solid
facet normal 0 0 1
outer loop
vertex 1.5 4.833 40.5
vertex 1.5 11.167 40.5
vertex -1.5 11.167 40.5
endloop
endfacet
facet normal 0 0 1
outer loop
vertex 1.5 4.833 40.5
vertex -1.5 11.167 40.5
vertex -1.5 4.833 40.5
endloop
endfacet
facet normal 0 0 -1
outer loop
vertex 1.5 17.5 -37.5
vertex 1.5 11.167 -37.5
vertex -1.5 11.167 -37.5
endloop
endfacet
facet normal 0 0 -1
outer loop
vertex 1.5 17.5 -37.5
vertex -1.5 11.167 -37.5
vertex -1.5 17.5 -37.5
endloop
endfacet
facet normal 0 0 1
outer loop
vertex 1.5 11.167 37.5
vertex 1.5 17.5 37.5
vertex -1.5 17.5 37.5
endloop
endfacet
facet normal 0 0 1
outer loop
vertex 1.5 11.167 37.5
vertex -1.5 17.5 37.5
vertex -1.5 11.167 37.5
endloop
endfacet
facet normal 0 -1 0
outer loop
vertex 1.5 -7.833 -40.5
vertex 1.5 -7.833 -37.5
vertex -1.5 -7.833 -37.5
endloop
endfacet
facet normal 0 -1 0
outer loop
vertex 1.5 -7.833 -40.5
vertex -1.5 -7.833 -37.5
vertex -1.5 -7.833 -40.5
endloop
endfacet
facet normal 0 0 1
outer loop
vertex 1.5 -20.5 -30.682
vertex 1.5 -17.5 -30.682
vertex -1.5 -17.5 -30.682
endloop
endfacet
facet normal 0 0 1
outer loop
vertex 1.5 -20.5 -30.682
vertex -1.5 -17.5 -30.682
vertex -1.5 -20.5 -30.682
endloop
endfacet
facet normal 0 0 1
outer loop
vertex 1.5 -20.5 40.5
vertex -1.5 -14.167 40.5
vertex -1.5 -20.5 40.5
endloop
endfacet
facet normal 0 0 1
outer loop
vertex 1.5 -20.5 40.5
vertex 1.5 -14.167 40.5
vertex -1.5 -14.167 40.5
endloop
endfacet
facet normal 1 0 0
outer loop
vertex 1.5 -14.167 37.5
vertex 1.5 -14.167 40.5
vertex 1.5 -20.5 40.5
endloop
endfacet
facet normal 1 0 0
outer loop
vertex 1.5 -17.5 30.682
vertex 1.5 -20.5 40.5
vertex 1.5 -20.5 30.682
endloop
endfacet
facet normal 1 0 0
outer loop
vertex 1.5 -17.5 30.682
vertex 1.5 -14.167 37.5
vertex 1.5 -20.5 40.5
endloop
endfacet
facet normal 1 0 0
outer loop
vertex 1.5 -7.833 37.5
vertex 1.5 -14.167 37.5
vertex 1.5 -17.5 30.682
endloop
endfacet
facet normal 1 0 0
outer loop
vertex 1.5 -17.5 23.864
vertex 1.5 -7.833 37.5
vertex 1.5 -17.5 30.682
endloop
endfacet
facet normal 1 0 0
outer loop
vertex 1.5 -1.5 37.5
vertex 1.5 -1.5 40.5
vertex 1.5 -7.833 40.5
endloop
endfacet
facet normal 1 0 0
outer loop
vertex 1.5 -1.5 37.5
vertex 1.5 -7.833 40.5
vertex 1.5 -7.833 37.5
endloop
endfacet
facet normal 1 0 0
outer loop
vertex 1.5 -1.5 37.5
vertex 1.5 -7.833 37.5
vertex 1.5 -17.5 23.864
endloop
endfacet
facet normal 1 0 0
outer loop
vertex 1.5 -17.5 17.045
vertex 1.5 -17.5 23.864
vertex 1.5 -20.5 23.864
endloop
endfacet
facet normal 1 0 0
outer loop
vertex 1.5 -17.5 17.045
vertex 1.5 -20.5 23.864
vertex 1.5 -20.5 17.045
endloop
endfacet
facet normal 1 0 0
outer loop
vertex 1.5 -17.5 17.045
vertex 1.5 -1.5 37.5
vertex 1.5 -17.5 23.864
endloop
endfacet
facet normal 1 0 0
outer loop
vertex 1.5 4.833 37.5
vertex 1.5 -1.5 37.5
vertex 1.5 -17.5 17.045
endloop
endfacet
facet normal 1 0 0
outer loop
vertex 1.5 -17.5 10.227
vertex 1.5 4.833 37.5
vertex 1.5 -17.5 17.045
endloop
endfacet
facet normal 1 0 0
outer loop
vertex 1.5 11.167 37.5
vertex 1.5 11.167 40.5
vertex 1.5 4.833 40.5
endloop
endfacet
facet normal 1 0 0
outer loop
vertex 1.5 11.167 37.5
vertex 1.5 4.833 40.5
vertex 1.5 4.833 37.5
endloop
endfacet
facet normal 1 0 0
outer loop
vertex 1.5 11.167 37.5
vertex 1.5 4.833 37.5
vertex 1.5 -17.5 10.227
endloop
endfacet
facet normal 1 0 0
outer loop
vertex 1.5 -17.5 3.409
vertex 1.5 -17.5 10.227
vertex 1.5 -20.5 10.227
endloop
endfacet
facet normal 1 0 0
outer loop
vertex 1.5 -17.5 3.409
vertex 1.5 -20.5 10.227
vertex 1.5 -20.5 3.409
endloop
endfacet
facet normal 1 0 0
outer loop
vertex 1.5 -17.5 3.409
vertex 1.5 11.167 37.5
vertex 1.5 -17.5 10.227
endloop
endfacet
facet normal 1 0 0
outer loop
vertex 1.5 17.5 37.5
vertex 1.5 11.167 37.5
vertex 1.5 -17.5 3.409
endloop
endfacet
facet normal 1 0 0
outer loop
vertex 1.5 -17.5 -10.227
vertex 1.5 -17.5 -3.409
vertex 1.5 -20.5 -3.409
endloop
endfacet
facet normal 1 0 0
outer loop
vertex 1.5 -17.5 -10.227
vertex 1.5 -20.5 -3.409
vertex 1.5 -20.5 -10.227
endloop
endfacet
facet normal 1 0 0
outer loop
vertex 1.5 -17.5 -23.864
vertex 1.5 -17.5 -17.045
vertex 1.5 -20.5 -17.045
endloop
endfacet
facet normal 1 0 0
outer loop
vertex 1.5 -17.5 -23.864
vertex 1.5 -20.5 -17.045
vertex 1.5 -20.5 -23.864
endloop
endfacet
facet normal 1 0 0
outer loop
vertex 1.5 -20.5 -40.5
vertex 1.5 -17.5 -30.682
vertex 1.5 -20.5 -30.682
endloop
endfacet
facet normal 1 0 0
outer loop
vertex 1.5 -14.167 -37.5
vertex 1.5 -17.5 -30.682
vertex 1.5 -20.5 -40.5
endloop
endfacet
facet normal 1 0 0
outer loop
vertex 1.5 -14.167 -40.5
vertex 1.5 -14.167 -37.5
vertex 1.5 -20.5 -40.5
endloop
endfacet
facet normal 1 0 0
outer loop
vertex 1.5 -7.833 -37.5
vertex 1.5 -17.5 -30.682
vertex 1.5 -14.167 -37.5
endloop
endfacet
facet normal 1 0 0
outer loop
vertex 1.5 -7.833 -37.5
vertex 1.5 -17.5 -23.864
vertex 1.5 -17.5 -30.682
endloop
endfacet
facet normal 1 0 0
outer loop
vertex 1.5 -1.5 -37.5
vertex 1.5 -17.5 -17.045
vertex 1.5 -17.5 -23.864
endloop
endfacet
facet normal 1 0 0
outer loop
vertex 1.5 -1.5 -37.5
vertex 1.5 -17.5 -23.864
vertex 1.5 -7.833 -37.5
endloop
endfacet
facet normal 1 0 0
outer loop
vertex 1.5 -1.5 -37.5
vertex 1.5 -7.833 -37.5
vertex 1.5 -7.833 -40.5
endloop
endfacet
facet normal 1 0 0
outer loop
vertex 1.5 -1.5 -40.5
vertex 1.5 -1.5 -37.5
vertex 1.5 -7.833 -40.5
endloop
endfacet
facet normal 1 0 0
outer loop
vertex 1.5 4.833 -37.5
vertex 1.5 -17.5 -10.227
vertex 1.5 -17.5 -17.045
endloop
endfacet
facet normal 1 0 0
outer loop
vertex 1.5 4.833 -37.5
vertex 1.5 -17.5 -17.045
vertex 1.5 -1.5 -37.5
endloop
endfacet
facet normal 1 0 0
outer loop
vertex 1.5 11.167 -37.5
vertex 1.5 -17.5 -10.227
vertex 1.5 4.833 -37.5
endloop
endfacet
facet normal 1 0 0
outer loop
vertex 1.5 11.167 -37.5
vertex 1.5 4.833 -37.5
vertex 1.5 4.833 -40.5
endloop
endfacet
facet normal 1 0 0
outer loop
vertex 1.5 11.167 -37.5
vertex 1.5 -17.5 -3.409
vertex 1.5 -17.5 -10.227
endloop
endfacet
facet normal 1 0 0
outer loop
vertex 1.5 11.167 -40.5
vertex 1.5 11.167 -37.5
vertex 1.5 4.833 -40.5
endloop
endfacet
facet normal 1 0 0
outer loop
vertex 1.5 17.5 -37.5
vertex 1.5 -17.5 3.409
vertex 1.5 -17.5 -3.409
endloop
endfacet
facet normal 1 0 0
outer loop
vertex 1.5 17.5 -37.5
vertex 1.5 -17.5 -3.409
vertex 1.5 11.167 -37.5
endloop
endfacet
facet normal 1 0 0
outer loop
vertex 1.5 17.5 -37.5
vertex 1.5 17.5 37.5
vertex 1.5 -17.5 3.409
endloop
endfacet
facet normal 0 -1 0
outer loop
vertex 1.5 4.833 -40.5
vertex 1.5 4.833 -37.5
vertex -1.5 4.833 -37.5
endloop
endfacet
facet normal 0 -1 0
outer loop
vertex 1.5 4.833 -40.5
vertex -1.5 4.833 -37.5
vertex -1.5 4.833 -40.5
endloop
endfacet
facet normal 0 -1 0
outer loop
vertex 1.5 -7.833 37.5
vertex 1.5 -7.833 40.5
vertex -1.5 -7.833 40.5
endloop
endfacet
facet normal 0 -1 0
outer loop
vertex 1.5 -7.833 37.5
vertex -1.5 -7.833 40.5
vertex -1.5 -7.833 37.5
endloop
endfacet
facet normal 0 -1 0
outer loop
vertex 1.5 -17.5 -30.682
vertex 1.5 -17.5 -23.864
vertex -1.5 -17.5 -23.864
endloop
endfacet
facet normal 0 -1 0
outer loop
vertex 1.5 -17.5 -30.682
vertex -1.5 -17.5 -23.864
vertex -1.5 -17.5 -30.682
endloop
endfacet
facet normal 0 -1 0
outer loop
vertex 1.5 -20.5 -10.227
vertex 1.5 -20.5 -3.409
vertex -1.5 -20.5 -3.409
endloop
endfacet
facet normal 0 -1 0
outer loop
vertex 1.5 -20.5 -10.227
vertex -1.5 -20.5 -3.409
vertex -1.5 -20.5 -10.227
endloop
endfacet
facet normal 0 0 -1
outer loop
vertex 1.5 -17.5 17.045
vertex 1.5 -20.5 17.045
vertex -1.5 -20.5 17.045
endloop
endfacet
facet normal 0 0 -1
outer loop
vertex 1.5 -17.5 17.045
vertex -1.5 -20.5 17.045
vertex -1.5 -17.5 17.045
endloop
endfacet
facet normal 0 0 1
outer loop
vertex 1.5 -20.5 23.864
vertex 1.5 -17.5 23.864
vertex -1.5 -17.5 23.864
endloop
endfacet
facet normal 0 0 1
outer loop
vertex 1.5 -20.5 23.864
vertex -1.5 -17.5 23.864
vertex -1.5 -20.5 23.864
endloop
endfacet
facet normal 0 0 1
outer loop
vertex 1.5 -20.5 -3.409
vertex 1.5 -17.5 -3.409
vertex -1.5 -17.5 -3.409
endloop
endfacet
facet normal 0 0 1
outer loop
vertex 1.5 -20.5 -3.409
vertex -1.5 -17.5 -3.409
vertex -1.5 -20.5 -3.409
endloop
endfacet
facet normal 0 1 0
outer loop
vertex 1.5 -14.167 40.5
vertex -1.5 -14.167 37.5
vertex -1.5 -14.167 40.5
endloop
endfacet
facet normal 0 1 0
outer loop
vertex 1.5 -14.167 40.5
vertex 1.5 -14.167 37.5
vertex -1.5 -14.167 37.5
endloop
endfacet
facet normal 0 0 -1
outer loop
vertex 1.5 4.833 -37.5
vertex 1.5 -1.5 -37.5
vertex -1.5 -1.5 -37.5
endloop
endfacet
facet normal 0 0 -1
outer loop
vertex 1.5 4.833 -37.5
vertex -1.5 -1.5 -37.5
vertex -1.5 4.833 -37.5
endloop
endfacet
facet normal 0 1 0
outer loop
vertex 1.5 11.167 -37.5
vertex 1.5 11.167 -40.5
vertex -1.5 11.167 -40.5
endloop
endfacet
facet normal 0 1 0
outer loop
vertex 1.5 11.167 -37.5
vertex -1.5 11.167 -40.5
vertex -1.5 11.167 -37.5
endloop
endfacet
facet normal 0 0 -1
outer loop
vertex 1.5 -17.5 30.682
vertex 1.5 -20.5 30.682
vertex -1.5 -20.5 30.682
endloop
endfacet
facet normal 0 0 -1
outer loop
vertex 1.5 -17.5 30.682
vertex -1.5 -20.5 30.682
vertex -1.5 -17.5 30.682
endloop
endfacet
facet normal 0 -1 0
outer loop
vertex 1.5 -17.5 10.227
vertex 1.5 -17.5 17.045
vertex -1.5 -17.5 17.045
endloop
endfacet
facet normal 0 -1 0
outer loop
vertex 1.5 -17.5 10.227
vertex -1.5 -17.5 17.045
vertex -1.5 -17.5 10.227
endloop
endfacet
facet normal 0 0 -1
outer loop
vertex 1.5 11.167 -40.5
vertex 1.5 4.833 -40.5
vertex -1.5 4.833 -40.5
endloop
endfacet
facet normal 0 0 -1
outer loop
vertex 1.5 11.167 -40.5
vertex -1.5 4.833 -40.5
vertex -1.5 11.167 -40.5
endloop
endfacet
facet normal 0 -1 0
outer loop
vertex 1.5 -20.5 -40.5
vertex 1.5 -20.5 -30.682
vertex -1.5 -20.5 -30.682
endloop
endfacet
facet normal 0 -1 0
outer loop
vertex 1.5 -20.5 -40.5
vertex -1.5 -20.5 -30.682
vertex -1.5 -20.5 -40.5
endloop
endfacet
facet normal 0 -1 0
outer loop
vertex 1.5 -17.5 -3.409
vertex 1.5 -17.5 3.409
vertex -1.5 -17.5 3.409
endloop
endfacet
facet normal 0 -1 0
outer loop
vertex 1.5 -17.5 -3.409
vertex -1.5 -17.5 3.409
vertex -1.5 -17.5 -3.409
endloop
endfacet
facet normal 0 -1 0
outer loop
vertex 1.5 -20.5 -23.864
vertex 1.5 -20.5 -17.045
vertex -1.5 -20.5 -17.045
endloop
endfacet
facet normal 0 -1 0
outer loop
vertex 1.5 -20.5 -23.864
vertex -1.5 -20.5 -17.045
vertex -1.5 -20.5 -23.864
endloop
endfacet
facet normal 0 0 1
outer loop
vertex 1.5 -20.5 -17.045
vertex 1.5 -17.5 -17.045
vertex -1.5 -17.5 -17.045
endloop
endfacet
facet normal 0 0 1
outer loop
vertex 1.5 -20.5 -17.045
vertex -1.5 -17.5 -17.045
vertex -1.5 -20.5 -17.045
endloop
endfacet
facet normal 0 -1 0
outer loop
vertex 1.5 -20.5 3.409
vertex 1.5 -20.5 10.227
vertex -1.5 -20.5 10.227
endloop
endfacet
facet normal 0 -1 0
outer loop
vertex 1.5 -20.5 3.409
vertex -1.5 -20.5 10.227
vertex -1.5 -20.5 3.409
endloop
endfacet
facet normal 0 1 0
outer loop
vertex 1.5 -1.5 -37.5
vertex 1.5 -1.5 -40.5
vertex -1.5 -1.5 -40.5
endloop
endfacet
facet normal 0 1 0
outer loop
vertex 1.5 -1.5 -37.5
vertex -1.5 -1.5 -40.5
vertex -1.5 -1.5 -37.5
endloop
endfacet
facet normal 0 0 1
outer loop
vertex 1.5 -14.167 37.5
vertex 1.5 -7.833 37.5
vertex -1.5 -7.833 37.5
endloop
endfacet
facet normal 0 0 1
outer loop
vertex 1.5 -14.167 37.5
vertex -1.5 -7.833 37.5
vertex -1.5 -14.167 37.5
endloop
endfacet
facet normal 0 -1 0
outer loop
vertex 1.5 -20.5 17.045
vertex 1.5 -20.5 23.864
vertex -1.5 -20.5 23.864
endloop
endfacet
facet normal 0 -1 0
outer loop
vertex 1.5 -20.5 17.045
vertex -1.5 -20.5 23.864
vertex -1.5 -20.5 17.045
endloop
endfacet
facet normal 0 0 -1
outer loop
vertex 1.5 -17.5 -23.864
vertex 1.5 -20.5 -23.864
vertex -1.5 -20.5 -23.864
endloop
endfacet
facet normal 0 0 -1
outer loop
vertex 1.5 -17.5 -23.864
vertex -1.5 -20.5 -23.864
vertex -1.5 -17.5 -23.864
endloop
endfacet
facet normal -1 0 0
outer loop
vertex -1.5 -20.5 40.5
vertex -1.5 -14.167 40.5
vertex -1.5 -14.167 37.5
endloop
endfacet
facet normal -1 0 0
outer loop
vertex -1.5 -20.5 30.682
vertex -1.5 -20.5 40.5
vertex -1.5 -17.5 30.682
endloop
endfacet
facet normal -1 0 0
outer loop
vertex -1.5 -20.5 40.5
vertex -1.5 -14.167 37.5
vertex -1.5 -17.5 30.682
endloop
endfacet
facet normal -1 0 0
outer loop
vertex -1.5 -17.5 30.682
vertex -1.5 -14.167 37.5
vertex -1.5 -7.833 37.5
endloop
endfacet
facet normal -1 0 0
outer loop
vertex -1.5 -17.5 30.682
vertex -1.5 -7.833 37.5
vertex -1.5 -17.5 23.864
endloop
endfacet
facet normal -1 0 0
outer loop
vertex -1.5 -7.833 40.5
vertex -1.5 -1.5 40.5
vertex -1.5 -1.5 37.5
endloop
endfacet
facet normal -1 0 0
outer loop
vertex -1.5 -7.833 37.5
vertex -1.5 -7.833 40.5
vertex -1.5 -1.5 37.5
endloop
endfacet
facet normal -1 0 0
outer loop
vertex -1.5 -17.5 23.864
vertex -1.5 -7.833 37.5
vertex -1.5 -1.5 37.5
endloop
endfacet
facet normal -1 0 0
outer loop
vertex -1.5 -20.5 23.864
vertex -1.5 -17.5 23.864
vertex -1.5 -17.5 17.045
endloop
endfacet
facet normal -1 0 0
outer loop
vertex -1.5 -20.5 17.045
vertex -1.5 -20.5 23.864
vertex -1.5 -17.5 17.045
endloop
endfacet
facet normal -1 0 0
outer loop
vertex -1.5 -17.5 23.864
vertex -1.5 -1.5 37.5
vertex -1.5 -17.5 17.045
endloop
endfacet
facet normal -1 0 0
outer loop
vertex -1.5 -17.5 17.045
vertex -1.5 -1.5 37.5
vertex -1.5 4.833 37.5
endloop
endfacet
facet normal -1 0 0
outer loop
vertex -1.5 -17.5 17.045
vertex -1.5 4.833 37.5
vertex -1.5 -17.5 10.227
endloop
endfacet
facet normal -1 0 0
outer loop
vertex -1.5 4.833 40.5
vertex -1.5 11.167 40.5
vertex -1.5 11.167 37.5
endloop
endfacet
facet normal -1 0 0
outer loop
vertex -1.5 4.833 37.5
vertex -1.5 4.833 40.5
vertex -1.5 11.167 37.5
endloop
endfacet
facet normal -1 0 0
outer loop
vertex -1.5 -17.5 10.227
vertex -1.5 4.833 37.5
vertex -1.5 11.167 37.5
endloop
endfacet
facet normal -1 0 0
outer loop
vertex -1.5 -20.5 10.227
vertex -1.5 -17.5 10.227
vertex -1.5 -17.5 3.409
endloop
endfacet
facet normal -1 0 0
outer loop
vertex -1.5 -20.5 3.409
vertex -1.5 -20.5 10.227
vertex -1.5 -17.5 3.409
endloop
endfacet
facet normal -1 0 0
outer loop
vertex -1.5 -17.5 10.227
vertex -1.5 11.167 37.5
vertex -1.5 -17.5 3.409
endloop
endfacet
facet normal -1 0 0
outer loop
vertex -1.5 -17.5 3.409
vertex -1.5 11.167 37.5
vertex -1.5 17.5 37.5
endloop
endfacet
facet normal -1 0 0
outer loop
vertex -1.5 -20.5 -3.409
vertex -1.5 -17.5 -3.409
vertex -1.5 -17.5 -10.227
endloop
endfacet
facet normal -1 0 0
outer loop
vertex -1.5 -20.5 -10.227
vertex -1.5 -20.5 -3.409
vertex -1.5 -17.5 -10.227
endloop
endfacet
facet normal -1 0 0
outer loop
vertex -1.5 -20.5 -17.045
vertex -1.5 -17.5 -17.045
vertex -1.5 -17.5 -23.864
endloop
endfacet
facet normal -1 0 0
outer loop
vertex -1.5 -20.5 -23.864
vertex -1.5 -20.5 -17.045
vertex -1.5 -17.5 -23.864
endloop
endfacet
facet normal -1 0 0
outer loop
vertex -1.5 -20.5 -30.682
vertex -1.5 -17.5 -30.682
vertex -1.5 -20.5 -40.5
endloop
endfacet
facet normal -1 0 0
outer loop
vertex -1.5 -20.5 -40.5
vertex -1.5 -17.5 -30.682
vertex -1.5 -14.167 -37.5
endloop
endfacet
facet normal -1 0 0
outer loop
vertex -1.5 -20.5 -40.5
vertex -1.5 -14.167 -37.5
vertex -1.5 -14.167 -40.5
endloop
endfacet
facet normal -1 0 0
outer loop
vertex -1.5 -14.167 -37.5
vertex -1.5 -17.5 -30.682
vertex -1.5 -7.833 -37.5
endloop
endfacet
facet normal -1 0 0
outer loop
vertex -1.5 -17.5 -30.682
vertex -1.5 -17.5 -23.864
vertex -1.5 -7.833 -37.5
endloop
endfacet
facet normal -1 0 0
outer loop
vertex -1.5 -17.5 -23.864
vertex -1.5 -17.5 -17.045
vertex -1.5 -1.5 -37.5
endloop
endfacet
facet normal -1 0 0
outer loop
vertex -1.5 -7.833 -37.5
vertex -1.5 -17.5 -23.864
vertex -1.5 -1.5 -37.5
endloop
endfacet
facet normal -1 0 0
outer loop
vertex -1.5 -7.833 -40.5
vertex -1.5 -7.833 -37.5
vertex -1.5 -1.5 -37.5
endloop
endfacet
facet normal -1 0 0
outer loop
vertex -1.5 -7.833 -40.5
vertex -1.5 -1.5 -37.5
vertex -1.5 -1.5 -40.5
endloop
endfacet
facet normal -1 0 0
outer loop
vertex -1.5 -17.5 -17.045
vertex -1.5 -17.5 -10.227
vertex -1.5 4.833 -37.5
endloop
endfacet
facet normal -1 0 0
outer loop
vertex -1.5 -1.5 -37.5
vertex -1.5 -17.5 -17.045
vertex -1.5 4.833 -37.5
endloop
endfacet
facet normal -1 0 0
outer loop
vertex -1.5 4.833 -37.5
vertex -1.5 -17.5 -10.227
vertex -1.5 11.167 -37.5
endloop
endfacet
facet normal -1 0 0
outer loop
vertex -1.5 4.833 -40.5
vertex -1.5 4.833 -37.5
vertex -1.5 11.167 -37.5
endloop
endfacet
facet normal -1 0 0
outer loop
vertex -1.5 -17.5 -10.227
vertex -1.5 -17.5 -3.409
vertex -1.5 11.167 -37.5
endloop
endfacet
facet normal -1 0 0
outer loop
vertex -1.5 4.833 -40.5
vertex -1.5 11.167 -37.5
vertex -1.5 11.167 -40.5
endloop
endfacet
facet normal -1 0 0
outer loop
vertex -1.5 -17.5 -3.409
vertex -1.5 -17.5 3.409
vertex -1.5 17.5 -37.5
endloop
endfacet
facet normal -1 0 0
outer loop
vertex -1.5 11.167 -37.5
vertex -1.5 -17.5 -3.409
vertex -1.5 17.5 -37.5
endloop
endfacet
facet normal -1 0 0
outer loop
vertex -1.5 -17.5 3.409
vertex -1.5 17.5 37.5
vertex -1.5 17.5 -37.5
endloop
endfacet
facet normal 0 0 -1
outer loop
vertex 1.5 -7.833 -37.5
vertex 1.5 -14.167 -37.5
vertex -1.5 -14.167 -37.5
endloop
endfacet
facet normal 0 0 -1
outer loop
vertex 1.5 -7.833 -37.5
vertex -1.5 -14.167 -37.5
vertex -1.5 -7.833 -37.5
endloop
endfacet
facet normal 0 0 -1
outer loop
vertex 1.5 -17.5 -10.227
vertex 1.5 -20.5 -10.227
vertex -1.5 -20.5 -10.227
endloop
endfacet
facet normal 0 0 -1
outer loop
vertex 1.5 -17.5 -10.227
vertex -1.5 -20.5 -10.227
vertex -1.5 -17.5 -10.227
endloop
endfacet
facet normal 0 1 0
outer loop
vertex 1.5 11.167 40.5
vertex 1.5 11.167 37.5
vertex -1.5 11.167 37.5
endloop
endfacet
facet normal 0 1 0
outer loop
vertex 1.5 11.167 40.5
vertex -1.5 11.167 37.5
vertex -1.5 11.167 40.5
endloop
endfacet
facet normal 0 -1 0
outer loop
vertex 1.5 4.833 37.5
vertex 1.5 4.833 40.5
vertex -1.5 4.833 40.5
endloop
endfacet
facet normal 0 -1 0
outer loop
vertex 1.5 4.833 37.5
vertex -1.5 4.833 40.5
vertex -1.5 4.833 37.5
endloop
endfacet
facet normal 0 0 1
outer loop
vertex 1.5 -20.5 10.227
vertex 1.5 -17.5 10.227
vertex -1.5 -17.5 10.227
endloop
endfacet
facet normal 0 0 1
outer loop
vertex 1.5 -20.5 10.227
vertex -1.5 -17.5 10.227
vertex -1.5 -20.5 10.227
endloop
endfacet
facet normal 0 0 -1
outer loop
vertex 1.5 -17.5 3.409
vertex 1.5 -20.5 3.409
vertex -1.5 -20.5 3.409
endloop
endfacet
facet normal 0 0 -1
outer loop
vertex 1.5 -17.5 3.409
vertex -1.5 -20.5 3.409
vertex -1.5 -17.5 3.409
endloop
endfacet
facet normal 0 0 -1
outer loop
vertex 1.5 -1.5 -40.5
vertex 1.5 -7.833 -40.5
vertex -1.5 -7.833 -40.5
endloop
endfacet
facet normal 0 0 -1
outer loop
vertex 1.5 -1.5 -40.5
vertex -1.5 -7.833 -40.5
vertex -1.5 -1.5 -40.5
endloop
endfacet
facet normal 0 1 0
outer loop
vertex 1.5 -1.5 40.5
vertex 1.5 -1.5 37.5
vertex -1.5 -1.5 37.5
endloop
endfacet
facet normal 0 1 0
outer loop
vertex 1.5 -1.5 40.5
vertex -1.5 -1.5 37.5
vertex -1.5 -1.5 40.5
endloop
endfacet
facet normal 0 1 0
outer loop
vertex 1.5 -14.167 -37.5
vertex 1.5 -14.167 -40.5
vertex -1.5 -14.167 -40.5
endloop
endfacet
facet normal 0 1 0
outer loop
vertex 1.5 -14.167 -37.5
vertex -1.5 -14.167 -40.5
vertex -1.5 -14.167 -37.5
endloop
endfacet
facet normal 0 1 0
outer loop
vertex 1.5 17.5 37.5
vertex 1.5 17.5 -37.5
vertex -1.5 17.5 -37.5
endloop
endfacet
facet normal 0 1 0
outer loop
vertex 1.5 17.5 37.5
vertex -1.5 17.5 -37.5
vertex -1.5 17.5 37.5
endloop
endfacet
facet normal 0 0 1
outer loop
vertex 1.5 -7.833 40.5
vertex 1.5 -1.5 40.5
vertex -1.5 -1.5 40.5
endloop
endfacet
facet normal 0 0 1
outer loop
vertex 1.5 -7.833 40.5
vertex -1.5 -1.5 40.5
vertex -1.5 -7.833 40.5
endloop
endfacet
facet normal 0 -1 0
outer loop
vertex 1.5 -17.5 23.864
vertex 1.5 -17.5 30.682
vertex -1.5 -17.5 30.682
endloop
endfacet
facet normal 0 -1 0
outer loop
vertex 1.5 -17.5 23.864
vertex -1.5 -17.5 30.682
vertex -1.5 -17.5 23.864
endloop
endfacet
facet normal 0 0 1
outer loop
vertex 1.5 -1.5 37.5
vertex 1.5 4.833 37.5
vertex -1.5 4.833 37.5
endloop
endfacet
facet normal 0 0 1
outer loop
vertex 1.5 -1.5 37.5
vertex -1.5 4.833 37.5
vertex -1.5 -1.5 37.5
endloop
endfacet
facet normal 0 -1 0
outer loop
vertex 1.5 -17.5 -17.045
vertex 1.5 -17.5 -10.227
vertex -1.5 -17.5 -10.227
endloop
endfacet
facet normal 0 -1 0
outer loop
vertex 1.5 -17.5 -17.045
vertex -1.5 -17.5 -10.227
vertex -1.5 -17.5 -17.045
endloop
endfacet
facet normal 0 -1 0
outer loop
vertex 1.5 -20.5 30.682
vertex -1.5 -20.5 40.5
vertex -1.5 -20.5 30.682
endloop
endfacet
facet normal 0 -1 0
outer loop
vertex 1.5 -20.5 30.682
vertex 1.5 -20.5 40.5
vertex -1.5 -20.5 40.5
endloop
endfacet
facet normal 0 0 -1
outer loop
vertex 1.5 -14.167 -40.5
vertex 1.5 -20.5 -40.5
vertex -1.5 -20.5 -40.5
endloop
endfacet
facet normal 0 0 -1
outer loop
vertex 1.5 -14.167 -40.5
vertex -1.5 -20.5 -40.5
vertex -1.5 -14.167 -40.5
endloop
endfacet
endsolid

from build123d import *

# Parameters (mm, degrees)
ESTRUSIONE_ESTRUSIONE3_DEPTH = 1.5


with BuildPart() as part:
    # Schizzo1 → Estrusione-Estrusione3 (new body, symmetric)
    with BuildSketch(Plane(origin=(0, 0, 0), x_dir=(0, 0, -1), z_dir=(1, 0, 0))):
        Polygon((-40.5, -20.5), (-37.5, -20.5), (-30.681818182, -20.5), (-30.681818182, -17.5), (-23.863636364, -17.5), (-23.863636364, -20.5), (-17.045454545, -20.5), (-17.045454545, -17.5), (-10.227272727, -17.5), (-10.227272727, -20.5), (-3.409090909, -20.5), (-3.409090909, -17.5), (3.409090909, -17.5), (3.409090909, -20.5), (10.227272727, -20.5), (10.227272727, -17.5), (17.045454545, -17.5), (17.045454545, -20.5), (23.863636364, -20.5), (23.863636364, -17.5), (30.681818182, -17.5), (30.681818182, -20.5), (37.5, -20.5), (40.5, -20.5), (40.5, -14.166666667), (37.5, -14.166666667), (37.5, -7.833333333), (40.5, -7.833333333), (40.5, -1.5), (37.5, -1.5), (37.5, 4.833333333), (40.5, 4.833333333), (40.5, 11.166666667), (37.5, 11.166666667), (37.5, 17.5), (-37.5, 17.5), (-37.5, 11.166666667), (-40.5, 11.166666667), (-40.5, 4.833333333), (-37.5, 4.833333333), (-37.5, -1.5), (-40.5, -1.5), (-40.5, -7.833333333), (-37.5, -7.833333333), (-37.5, -14.166666667), (-40.5, -14.166666667), align=None)
    extrude(amount=ESTRUSIONE_ESTRUSIONE3_DEPTH, both=True)


solid = part.part
